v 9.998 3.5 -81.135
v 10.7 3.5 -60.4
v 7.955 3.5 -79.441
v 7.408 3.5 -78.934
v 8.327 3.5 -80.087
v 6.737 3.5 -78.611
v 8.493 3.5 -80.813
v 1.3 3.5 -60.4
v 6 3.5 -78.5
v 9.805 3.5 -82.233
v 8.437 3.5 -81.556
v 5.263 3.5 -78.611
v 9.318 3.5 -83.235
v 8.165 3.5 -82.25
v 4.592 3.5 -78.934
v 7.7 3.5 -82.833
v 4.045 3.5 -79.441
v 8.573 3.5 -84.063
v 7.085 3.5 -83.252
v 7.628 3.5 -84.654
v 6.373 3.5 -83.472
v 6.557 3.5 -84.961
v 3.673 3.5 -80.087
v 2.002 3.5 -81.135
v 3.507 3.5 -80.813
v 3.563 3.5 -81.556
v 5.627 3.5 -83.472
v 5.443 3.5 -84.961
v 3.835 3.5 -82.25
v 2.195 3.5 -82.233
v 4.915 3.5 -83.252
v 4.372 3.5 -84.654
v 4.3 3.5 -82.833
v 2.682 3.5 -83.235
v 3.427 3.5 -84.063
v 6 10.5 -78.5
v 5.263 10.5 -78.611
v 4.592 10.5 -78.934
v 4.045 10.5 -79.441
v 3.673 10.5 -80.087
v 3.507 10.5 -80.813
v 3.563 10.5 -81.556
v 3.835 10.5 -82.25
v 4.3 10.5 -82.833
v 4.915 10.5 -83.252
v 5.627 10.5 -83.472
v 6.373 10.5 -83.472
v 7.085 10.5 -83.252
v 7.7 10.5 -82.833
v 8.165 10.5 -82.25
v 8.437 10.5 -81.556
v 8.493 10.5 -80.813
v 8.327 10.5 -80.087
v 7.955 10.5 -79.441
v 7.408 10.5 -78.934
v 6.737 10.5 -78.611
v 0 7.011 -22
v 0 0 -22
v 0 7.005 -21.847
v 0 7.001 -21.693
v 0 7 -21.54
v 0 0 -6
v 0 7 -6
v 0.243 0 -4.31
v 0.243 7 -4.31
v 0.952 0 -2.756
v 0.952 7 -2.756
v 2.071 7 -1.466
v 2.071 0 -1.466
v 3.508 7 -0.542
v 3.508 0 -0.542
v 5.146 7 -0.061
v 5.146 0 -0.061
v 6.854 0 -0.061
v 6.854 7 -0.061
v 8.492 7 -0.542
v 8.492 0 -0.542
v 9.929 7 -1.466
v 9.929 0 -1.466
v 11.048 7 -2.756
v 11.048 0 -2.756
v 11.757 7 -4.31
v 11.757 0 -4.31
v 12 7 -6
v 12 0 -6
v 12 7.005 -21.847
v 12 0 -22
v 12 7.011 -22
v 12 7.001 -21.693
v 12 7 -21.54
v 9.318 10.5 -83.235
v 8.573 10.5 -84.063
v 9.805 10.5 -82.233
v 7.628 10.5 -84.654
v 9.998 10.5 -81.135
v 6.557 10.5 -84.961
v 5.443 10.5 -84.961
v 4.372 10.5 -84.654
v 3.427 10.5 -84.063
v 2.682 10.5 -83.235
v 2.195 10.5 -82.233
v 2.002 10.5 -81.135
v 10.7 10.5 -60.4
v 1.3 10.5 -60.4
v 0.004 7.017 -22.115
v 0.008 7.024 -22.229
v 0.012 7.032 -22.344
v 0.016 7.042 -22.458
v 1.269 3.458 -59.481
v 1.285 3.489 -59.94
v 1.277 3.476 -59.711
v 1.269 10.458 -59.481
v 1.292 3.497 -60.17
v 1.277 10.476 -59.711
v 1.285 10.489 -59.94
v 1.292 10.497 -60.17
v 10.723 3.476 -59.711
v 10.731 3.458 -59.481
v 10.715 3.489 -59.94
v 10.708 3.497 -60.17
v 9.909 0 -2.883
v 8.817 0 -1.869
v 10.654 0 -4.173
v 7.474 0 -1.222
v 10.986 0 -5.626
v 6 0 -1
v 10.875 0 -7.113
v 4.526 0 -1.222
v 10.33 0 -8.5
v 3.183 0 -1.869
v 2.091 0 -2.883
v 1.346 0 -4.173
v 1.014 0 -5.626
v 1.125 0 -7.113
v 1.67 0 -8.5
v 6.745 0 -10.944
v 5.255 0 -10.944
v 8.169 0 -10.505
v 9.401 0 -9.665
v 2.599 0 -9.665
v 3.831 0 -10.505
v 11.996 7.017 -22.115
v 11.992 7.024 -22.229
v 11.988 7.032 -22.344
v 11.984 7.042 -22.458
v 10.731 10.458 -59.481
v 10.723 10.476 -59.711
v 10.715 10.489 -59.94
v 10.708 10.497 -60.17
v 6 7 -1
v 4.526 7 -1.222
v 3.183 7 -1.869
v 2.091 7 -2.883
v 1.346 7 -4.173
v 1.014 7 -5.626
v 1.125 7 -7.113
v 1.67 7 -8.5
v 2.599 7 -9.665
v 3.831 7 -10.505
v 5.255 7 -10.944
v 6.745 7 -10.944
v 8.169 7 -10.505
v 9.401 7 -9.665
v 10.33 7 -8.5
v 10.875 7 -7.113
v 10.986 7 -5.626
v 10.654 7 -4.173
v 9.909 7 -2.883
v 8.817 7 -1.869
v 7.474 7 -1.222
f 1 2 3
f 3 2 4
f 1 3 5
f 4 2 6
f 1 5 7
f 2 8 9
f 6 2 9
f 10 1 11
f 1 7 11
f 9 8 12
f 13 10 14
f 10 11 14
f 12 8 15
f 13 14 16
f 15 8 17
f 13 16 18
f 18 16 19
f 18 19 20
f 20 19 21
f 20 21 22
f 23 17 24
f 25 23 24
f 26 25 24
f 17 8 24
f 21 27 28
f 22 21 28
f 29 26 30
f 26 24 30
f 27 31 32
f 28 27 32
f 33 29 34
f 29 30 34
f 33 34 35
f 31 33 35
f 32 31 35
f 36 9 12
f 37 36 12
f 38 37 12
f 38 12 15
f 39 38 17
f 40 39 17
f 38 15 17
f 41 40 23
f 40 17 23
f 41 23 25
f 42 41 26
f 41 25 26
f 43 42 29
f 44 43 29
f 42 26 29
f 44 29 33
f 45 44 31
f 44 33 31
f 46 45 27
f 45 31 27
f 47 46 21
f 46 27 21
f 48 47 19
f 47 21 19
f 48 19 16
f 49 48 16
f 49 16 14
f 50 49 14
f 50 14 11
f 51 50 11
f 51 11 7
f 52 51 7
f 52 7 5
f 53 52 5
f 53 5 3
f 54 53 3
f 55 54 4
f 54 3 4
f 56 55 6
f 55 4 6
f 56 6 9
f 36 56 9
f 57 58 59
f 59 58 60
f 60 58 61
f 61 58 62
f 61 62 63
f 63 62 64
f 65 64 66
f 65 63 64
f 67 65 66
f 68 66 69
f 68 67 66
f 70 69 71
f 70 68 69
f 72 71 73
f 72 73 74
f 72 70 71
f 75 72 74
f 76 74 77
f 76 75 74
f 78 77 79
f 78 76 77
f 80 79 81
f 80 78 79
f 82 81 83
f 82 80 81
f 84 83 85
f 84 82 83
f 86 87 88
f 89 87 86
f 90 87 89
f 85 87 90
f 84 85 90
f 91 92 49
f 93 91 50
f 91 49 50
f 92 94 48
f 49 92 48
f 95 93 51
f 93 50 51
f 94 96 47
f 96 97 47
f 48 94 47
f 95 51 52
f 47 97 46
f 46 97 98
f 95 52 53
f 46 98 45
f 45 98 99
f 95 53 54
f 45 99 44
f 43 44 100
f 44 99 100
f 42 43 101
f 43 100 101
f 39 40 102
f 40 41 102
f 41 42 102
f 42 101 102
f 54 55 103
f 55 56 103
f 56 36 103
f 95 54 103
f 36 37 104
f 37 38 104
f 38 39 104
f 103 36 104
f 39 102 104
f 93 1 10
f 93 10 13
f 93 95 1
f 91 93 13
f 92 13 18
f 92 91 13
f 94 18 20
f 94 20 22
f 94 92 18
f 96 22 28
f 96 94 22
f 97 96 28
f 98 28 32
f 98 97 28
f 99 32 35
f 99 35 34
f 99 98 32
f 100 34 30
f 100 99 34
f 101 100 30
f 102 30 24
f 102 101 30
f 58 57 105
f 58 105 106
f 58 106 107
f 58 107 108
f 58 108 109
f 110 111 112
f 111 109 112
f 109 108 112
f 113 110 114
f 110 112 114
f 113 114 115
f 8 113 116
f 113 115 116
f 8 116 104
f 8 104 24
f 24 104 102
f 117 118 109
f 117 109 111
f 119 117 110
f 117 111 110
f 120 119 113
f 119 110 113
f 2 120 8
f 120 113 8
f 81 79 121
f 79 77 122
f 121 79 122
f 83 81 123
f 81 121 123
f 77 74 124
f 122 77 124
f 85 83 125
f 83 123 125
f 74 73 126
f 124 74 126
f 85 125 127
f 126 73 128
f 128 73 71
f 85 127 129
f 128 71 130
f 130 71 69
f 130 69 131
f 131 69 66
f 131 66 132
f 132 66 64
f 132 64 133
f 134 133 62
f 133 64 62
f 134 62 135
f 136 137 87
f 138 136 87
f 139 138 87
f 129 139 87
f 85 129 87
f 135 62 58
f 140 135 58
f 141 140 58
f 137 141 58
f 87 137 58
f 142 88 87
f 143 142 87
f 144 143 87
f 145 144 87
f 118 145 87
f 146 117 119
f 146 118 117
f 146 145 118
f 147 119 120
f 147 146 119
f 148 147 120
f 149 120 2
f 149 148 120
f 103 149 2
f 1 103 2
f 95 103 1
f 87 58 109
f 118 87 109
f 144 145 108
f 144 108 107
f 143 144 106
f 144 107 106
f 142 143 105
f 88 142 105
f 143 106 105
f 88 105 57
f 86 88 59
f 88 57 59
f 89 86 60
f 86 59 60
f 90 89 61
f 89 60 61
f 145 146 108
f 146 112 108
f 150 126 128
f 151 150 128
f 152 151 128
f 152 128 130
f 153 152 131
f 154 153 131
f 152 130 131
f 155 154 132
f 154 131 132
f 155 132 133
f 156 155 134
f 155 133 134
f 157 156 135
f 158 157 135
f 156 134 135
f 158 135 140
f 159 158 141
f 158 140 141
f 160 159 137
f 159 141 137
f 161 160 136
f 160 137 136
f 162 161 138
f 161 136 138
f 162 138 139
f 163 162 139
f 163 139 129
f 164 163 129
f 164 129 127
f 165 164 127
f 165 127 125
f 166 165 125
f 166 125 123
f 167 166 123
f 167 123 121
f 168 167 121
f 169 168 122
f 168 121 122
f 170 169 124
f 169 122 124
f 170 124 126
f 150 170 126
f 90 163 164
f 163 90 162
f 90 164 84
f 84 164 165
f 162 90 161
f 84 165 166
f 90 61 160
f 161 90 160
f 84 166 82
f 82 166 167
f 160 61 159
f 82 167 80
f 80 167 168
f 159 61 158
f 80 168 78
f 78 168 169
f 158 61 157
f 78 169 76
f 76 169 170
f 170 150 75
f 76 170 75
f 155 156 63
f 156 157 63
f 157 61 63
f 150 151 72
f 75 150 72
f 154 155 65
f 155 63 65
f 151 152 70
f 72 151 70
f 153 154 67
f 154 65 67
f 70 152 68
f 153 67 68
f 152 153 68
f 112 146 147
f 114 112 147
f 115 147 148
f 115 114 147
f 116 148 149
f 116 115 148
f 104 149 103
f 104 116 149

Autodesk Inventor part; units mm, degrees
ref_plane "YZ Plane" through (0, 0, 0) normal (1, 0, 0) x (0, 1, 0)
ref_plane "XZ Plane" through (0, 0, 0) normal (0, 1, 0) x (-1, 0, 0)
ref_plane "XY Plane" through (0, 0, 0) normal (0, 0, 1) x (1, 0, 0)
sketch "Sketch19" plane through (0, 0, 0) normal (1, 0, 0) x (0, 1, 0)
  line L0 (0, 0) -> (0, -22)
  line L1 (0, -22) -> (3.4577, -59.4814)
  line L2 (3.5, -60.4) -> (3.5, -85)
  line L3 (3.5, -85) -> (10.5, -85)
  line L4 (10.5, -85) -> (10.5, -60.4)
  line L5 (10.4577, -59.4814) -> (7, -22)
  line L6 (7, -22) -> (7, 0)
  line L7 (7, 0) -> (0, 0)
  arc A0 (3.5, -60.4) -> (3.4577, -59.4814) centre (-6.5, -60.4) ccw
  arc A1 (10.5, -60.4) -> (10.4577, -59.4814) centre (0.5, -60.4) ccw
  point P0 (10.4894, -59.9402)
  dimension "d79" = 10
  dimension "d80" = 10
  dimension "d82" = 7
  dimension "d83" = 3.5
  dimension "d84" = 24.6
  dimension "d85" = 22
  dimension "d86" = 37.9402
extrude "Extrusion7" add sketch "Sketch19" along normal blind 12
sketch "Sketch20" plane through (0, 7, 0) normal (0, 1, 0) x (1, 0, 0)
  circle A0 centre (6, 6) radius 6
  line L0 (0, 0) -> (12, 0) projected
  line L1 (0, 0) -> (12, 0) projected
  line L2 (0, 0) -> (0, 6)
  line L3 (0, 0) -> (0, 22) projected
  line L4 (12, 0) -> (12, 6)
  point P0 (6, 0)
  point P1 (6, 0)
  dimension "d89" = 12
extrude "Extrusion8" cut sketch "Sketch20" against normal blind 12 contours L4 L0 A0 | A0 L0 L2
sketch "Sketch21" plane through (0, 10.5, -60.4) normal (0, 1, 0) x (1, 0, 0)
  circle A0 centre (6, 20.6) radius 4
  line L0 (0, 24.6) -> (12, 24.6) projected
  arc A1 (0, -54.4) -> (12, -54.4) centre (6, -54.4) ccw projected
  line L1 (12, -38.4) -> (12, -54.4) projected
  line L2 (0, -38.4) -> (12, -38.4) projected
  line L3 (0, -38.4) -> (0, -54.4) projected
  line L4 (0, -38.4) -> (2.0023, 20.7354)
  line L5 (12, -38.4) -> (12, -0.9186) projected
  line L6 (12, -38.4) -> (9.9977, 20.7354)
  line L7 (0, 24.6) -> (0, 0) projected
  line L8 (0, -38.4) -> (0, 24.6)
  line L9 (0, 24.6) -> (6, 24.6)
  line L10 (6, 24.6) -> (12, 24.6)
  line L11 (12, 0) -> (12, 24.6) projected
  line L12 (12, 24.6) -> (12, -38.4)
  point P0 (0, -60.4)
  point P1 (12, 0)
  dimension "d93" = 8
extrude "Extrusion9" cut sketch "Sketch21" against normal up to surface (10.5 mm away) contours A0 L0 L11 L12 L5 L6 | L4 L8 L7 L0 A0
sketch "Sketch22" plane through (6, 7, -6) normal (0, 1, 0) x (1, 0, 0)
  arc A0 (-6, 0) -> (6, 0) centre (0, 0) ccw projected
  point P0 (-6, -6)
hole "Hole1" at (6, 7, -6) direction (0, -1, 0) diameter 10 end through all
sketch "Sketch23" plane through (6, 10.5, -81) normal (0, 1, 0) x (1, 0, 0)
  arc A0 (3.9977, 0.1354) -> (-3.9977, 0.1354) centre (0, 0) ccw projected
  point P0 (-6, -81)
hole "Hole2" at (6, 10.5, -81) direction (0, -1, 0) diameter 5 end through all
fillet "Fillet1" radius 10 1 edges at (6, 7, -22)
properties part number "47"
